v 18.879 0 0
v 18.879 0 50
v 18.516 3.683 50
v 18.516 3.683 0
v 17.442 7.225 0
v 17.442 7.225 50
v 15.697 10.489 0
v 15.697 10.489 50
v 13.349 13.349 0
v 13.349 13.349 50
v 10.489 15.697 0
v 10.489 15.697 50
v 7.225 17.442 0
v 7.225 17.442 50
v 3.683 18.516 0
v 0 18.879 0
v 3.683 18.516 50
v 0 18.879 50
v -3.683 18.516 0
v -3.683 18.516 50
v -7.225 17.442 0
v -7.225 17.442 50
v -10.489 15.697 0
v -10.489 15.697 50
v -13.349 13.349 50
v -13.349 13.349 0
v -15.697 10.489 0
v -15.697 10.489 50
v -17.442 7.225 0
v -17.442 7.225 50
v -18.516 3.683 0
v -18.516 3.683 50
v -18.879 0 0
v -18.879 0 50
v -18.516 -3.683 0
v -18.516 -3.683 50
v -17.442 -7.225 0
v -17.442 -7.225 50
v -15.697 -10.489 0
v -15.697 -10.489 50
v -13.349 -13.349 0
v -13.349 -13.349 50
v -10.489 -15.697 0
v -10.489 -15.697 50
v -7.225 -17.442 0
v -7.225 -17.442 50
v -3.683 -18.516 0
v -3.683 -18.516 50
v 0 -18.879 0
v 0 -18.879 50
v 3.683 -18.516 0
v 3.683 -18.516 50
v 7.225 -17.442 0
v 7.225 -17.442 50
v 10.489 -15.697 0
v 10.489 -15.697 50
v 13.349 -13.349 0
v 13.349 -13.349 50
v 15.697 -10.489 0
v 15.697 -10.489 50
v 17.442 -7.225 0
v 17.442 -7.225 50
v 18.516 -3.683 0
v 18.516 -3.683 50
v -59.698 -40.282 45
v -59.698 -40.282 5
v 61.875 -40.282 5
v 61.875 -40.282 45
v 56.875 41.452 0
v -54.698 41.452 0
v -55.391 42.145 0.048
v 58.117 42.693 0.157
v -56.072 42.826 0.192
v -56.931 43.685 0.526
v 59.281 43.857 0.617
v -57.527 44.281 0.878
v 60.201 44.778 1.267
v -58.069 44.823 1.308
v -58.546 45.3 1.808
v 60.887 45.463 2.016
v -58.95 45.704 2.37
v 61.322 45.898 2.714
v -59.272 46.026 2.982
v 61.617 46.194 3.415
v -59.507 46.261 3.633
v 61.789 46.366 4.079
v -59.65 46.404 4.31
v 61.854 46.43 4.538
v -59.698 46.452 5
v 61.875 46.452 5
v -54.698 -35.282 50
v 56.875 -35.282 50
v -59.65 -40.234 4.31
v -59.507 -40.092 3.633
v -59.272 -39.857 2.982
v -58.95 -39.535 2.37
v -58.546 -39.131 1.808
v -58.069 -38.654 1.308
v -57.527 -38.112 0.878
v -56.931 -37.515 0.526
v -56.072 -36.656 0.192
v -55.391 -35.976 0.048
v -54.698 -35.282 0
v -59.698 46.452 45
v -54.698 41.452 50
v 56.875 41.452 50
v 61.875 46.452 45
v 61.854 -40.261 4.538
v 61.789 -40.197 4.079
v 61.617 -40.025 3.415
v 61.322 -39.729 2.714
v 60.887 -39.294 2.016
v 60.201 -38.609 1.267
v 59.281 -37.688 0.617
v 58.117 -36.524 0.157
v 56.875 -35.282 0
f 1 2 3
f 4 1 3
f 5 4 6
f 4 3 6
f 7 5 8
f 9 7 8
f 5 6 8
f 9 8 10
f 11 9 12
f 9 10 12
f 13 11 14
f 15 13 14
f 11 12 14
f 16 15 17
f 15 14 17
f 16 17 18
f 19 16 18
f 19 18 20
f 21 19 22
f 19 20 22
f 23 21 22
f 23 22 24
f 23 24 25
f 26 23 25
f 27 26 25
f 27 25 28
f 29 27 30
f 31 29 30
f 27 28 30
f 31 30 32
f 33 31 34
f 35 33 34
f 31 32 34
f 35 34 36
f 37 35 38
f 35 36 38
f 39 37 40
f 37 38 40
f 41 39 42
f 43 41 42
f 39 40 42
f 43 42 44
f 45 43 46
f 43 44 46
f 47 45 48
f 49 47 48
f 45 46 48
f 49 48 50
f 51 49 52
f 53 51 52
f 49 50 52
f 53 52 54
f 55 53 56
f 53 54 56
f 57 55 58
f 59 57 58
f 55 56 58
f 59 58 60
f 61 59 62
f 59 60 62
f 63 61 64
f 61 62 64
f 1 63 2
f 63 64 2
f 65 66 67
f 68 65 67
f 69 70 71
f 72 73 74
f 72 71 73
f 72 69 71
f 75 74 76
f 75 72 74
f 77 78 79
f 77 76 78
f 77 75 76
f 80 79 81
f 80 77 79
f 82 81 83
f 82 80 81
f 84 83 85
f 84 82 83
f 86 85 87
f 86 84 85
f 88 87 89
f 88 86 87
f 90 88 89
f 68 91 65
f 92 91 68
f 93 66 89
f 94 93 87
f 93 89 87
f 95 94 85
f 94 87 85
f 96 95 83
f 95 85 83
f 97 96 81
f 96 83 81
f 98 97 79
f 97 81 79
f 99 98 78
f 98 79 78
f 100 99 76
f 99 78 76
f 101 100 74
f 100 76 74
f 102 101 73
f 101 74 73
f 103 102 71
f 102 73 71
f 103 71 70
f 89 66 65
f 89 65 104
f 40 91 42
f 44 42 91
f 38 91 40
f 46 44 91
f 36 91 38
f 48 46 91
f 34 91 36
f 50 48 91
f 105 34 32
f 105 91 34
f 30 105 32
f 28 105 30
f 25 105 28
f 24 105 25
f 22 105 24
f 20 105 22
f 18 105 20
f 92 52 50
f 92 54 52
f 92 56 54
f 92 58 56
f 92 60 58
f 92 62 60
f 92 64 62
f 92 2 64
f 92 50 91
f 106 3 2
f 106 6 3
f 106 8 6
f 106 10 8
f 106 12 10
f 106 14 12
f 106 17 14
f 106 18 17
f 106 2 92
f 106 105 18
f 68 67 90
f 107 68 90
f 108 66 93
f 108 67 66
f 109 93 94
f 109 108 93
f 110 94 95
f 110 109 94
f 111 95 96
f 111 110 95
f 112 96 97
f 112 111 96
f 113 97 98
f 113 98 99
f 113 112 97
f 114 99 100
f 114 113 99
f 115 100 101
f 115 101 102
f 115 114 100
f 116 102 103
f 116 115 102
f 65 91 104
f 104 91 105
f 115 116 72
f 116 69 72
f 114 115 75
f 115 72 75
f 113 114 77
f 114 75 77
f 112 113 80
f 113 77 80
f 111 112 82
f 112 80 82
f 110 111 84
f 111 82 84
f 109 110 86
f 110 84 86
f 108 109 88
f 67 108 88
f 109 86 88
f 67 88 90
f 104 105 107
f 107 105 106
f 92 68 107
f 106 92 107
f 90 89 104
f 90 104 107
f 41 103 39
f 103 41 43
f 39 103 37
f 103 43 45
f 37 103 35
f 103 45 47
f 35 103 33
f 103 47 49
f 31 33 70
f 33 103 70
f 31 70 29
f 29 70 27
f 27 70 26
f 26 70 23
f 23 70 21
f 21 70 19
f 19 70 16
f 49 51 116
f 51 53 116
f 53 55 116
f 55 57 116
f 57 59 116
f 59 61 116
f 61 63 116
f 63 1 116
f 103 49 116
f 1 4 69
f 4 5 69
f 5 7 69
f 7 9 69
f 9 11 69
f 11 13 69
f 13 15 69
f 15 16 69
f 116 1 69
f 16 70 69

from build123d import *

# Parameters (mm, degrees)
F0_W     = 121.572584
F0_H     = 86.733874
F1_DEPTH = 50
F2_R     = 18.878817
F3_DEPTH = 50
F4_SIZE  = 5
F5_R     = 5


with BuildPart() as f1:
    # F0 (on Top) → F1 (new body)
    with BuildSketch(Plane.XY):
        with Locations((1.088709, 3.084676)):
            Rectangle(F0_W, F0_H)
    extrude(amount=F1_DEPTH)

    # F2 (on face) → F3 (cut)
    with BuildSketch(Plane.XY.offset(50)):
        Circle(F2_R)
    extrude(amount=-F3_DEPTH, mode=Mode.SUBTRACT)

    # F4
    f4_edges = [f1.edges().sort_by_distance(p)[0] for p in [
        (1.088709, -40.282261, 50),
        (61.875001, 3.084676, 50),
        (1.088709, 46.451613, 50),
        (-59.697583, 3.084676, 50),
    ]]
    chamfer(f4_edges, length=F4_SIZE)

    # F5
    f5_edges = [f1.edges().sort_by_distance(p)[0] for p in [
        (61.875001, 3.084676, 0),
        (1.088709, -40.282261, 0),
        (-59.697583, 3.084676, 0),
        (1.088709, 46.451613, 0),
    ]]
    fillet(f5_edges, radius=F5_R)


solid = f1.part
